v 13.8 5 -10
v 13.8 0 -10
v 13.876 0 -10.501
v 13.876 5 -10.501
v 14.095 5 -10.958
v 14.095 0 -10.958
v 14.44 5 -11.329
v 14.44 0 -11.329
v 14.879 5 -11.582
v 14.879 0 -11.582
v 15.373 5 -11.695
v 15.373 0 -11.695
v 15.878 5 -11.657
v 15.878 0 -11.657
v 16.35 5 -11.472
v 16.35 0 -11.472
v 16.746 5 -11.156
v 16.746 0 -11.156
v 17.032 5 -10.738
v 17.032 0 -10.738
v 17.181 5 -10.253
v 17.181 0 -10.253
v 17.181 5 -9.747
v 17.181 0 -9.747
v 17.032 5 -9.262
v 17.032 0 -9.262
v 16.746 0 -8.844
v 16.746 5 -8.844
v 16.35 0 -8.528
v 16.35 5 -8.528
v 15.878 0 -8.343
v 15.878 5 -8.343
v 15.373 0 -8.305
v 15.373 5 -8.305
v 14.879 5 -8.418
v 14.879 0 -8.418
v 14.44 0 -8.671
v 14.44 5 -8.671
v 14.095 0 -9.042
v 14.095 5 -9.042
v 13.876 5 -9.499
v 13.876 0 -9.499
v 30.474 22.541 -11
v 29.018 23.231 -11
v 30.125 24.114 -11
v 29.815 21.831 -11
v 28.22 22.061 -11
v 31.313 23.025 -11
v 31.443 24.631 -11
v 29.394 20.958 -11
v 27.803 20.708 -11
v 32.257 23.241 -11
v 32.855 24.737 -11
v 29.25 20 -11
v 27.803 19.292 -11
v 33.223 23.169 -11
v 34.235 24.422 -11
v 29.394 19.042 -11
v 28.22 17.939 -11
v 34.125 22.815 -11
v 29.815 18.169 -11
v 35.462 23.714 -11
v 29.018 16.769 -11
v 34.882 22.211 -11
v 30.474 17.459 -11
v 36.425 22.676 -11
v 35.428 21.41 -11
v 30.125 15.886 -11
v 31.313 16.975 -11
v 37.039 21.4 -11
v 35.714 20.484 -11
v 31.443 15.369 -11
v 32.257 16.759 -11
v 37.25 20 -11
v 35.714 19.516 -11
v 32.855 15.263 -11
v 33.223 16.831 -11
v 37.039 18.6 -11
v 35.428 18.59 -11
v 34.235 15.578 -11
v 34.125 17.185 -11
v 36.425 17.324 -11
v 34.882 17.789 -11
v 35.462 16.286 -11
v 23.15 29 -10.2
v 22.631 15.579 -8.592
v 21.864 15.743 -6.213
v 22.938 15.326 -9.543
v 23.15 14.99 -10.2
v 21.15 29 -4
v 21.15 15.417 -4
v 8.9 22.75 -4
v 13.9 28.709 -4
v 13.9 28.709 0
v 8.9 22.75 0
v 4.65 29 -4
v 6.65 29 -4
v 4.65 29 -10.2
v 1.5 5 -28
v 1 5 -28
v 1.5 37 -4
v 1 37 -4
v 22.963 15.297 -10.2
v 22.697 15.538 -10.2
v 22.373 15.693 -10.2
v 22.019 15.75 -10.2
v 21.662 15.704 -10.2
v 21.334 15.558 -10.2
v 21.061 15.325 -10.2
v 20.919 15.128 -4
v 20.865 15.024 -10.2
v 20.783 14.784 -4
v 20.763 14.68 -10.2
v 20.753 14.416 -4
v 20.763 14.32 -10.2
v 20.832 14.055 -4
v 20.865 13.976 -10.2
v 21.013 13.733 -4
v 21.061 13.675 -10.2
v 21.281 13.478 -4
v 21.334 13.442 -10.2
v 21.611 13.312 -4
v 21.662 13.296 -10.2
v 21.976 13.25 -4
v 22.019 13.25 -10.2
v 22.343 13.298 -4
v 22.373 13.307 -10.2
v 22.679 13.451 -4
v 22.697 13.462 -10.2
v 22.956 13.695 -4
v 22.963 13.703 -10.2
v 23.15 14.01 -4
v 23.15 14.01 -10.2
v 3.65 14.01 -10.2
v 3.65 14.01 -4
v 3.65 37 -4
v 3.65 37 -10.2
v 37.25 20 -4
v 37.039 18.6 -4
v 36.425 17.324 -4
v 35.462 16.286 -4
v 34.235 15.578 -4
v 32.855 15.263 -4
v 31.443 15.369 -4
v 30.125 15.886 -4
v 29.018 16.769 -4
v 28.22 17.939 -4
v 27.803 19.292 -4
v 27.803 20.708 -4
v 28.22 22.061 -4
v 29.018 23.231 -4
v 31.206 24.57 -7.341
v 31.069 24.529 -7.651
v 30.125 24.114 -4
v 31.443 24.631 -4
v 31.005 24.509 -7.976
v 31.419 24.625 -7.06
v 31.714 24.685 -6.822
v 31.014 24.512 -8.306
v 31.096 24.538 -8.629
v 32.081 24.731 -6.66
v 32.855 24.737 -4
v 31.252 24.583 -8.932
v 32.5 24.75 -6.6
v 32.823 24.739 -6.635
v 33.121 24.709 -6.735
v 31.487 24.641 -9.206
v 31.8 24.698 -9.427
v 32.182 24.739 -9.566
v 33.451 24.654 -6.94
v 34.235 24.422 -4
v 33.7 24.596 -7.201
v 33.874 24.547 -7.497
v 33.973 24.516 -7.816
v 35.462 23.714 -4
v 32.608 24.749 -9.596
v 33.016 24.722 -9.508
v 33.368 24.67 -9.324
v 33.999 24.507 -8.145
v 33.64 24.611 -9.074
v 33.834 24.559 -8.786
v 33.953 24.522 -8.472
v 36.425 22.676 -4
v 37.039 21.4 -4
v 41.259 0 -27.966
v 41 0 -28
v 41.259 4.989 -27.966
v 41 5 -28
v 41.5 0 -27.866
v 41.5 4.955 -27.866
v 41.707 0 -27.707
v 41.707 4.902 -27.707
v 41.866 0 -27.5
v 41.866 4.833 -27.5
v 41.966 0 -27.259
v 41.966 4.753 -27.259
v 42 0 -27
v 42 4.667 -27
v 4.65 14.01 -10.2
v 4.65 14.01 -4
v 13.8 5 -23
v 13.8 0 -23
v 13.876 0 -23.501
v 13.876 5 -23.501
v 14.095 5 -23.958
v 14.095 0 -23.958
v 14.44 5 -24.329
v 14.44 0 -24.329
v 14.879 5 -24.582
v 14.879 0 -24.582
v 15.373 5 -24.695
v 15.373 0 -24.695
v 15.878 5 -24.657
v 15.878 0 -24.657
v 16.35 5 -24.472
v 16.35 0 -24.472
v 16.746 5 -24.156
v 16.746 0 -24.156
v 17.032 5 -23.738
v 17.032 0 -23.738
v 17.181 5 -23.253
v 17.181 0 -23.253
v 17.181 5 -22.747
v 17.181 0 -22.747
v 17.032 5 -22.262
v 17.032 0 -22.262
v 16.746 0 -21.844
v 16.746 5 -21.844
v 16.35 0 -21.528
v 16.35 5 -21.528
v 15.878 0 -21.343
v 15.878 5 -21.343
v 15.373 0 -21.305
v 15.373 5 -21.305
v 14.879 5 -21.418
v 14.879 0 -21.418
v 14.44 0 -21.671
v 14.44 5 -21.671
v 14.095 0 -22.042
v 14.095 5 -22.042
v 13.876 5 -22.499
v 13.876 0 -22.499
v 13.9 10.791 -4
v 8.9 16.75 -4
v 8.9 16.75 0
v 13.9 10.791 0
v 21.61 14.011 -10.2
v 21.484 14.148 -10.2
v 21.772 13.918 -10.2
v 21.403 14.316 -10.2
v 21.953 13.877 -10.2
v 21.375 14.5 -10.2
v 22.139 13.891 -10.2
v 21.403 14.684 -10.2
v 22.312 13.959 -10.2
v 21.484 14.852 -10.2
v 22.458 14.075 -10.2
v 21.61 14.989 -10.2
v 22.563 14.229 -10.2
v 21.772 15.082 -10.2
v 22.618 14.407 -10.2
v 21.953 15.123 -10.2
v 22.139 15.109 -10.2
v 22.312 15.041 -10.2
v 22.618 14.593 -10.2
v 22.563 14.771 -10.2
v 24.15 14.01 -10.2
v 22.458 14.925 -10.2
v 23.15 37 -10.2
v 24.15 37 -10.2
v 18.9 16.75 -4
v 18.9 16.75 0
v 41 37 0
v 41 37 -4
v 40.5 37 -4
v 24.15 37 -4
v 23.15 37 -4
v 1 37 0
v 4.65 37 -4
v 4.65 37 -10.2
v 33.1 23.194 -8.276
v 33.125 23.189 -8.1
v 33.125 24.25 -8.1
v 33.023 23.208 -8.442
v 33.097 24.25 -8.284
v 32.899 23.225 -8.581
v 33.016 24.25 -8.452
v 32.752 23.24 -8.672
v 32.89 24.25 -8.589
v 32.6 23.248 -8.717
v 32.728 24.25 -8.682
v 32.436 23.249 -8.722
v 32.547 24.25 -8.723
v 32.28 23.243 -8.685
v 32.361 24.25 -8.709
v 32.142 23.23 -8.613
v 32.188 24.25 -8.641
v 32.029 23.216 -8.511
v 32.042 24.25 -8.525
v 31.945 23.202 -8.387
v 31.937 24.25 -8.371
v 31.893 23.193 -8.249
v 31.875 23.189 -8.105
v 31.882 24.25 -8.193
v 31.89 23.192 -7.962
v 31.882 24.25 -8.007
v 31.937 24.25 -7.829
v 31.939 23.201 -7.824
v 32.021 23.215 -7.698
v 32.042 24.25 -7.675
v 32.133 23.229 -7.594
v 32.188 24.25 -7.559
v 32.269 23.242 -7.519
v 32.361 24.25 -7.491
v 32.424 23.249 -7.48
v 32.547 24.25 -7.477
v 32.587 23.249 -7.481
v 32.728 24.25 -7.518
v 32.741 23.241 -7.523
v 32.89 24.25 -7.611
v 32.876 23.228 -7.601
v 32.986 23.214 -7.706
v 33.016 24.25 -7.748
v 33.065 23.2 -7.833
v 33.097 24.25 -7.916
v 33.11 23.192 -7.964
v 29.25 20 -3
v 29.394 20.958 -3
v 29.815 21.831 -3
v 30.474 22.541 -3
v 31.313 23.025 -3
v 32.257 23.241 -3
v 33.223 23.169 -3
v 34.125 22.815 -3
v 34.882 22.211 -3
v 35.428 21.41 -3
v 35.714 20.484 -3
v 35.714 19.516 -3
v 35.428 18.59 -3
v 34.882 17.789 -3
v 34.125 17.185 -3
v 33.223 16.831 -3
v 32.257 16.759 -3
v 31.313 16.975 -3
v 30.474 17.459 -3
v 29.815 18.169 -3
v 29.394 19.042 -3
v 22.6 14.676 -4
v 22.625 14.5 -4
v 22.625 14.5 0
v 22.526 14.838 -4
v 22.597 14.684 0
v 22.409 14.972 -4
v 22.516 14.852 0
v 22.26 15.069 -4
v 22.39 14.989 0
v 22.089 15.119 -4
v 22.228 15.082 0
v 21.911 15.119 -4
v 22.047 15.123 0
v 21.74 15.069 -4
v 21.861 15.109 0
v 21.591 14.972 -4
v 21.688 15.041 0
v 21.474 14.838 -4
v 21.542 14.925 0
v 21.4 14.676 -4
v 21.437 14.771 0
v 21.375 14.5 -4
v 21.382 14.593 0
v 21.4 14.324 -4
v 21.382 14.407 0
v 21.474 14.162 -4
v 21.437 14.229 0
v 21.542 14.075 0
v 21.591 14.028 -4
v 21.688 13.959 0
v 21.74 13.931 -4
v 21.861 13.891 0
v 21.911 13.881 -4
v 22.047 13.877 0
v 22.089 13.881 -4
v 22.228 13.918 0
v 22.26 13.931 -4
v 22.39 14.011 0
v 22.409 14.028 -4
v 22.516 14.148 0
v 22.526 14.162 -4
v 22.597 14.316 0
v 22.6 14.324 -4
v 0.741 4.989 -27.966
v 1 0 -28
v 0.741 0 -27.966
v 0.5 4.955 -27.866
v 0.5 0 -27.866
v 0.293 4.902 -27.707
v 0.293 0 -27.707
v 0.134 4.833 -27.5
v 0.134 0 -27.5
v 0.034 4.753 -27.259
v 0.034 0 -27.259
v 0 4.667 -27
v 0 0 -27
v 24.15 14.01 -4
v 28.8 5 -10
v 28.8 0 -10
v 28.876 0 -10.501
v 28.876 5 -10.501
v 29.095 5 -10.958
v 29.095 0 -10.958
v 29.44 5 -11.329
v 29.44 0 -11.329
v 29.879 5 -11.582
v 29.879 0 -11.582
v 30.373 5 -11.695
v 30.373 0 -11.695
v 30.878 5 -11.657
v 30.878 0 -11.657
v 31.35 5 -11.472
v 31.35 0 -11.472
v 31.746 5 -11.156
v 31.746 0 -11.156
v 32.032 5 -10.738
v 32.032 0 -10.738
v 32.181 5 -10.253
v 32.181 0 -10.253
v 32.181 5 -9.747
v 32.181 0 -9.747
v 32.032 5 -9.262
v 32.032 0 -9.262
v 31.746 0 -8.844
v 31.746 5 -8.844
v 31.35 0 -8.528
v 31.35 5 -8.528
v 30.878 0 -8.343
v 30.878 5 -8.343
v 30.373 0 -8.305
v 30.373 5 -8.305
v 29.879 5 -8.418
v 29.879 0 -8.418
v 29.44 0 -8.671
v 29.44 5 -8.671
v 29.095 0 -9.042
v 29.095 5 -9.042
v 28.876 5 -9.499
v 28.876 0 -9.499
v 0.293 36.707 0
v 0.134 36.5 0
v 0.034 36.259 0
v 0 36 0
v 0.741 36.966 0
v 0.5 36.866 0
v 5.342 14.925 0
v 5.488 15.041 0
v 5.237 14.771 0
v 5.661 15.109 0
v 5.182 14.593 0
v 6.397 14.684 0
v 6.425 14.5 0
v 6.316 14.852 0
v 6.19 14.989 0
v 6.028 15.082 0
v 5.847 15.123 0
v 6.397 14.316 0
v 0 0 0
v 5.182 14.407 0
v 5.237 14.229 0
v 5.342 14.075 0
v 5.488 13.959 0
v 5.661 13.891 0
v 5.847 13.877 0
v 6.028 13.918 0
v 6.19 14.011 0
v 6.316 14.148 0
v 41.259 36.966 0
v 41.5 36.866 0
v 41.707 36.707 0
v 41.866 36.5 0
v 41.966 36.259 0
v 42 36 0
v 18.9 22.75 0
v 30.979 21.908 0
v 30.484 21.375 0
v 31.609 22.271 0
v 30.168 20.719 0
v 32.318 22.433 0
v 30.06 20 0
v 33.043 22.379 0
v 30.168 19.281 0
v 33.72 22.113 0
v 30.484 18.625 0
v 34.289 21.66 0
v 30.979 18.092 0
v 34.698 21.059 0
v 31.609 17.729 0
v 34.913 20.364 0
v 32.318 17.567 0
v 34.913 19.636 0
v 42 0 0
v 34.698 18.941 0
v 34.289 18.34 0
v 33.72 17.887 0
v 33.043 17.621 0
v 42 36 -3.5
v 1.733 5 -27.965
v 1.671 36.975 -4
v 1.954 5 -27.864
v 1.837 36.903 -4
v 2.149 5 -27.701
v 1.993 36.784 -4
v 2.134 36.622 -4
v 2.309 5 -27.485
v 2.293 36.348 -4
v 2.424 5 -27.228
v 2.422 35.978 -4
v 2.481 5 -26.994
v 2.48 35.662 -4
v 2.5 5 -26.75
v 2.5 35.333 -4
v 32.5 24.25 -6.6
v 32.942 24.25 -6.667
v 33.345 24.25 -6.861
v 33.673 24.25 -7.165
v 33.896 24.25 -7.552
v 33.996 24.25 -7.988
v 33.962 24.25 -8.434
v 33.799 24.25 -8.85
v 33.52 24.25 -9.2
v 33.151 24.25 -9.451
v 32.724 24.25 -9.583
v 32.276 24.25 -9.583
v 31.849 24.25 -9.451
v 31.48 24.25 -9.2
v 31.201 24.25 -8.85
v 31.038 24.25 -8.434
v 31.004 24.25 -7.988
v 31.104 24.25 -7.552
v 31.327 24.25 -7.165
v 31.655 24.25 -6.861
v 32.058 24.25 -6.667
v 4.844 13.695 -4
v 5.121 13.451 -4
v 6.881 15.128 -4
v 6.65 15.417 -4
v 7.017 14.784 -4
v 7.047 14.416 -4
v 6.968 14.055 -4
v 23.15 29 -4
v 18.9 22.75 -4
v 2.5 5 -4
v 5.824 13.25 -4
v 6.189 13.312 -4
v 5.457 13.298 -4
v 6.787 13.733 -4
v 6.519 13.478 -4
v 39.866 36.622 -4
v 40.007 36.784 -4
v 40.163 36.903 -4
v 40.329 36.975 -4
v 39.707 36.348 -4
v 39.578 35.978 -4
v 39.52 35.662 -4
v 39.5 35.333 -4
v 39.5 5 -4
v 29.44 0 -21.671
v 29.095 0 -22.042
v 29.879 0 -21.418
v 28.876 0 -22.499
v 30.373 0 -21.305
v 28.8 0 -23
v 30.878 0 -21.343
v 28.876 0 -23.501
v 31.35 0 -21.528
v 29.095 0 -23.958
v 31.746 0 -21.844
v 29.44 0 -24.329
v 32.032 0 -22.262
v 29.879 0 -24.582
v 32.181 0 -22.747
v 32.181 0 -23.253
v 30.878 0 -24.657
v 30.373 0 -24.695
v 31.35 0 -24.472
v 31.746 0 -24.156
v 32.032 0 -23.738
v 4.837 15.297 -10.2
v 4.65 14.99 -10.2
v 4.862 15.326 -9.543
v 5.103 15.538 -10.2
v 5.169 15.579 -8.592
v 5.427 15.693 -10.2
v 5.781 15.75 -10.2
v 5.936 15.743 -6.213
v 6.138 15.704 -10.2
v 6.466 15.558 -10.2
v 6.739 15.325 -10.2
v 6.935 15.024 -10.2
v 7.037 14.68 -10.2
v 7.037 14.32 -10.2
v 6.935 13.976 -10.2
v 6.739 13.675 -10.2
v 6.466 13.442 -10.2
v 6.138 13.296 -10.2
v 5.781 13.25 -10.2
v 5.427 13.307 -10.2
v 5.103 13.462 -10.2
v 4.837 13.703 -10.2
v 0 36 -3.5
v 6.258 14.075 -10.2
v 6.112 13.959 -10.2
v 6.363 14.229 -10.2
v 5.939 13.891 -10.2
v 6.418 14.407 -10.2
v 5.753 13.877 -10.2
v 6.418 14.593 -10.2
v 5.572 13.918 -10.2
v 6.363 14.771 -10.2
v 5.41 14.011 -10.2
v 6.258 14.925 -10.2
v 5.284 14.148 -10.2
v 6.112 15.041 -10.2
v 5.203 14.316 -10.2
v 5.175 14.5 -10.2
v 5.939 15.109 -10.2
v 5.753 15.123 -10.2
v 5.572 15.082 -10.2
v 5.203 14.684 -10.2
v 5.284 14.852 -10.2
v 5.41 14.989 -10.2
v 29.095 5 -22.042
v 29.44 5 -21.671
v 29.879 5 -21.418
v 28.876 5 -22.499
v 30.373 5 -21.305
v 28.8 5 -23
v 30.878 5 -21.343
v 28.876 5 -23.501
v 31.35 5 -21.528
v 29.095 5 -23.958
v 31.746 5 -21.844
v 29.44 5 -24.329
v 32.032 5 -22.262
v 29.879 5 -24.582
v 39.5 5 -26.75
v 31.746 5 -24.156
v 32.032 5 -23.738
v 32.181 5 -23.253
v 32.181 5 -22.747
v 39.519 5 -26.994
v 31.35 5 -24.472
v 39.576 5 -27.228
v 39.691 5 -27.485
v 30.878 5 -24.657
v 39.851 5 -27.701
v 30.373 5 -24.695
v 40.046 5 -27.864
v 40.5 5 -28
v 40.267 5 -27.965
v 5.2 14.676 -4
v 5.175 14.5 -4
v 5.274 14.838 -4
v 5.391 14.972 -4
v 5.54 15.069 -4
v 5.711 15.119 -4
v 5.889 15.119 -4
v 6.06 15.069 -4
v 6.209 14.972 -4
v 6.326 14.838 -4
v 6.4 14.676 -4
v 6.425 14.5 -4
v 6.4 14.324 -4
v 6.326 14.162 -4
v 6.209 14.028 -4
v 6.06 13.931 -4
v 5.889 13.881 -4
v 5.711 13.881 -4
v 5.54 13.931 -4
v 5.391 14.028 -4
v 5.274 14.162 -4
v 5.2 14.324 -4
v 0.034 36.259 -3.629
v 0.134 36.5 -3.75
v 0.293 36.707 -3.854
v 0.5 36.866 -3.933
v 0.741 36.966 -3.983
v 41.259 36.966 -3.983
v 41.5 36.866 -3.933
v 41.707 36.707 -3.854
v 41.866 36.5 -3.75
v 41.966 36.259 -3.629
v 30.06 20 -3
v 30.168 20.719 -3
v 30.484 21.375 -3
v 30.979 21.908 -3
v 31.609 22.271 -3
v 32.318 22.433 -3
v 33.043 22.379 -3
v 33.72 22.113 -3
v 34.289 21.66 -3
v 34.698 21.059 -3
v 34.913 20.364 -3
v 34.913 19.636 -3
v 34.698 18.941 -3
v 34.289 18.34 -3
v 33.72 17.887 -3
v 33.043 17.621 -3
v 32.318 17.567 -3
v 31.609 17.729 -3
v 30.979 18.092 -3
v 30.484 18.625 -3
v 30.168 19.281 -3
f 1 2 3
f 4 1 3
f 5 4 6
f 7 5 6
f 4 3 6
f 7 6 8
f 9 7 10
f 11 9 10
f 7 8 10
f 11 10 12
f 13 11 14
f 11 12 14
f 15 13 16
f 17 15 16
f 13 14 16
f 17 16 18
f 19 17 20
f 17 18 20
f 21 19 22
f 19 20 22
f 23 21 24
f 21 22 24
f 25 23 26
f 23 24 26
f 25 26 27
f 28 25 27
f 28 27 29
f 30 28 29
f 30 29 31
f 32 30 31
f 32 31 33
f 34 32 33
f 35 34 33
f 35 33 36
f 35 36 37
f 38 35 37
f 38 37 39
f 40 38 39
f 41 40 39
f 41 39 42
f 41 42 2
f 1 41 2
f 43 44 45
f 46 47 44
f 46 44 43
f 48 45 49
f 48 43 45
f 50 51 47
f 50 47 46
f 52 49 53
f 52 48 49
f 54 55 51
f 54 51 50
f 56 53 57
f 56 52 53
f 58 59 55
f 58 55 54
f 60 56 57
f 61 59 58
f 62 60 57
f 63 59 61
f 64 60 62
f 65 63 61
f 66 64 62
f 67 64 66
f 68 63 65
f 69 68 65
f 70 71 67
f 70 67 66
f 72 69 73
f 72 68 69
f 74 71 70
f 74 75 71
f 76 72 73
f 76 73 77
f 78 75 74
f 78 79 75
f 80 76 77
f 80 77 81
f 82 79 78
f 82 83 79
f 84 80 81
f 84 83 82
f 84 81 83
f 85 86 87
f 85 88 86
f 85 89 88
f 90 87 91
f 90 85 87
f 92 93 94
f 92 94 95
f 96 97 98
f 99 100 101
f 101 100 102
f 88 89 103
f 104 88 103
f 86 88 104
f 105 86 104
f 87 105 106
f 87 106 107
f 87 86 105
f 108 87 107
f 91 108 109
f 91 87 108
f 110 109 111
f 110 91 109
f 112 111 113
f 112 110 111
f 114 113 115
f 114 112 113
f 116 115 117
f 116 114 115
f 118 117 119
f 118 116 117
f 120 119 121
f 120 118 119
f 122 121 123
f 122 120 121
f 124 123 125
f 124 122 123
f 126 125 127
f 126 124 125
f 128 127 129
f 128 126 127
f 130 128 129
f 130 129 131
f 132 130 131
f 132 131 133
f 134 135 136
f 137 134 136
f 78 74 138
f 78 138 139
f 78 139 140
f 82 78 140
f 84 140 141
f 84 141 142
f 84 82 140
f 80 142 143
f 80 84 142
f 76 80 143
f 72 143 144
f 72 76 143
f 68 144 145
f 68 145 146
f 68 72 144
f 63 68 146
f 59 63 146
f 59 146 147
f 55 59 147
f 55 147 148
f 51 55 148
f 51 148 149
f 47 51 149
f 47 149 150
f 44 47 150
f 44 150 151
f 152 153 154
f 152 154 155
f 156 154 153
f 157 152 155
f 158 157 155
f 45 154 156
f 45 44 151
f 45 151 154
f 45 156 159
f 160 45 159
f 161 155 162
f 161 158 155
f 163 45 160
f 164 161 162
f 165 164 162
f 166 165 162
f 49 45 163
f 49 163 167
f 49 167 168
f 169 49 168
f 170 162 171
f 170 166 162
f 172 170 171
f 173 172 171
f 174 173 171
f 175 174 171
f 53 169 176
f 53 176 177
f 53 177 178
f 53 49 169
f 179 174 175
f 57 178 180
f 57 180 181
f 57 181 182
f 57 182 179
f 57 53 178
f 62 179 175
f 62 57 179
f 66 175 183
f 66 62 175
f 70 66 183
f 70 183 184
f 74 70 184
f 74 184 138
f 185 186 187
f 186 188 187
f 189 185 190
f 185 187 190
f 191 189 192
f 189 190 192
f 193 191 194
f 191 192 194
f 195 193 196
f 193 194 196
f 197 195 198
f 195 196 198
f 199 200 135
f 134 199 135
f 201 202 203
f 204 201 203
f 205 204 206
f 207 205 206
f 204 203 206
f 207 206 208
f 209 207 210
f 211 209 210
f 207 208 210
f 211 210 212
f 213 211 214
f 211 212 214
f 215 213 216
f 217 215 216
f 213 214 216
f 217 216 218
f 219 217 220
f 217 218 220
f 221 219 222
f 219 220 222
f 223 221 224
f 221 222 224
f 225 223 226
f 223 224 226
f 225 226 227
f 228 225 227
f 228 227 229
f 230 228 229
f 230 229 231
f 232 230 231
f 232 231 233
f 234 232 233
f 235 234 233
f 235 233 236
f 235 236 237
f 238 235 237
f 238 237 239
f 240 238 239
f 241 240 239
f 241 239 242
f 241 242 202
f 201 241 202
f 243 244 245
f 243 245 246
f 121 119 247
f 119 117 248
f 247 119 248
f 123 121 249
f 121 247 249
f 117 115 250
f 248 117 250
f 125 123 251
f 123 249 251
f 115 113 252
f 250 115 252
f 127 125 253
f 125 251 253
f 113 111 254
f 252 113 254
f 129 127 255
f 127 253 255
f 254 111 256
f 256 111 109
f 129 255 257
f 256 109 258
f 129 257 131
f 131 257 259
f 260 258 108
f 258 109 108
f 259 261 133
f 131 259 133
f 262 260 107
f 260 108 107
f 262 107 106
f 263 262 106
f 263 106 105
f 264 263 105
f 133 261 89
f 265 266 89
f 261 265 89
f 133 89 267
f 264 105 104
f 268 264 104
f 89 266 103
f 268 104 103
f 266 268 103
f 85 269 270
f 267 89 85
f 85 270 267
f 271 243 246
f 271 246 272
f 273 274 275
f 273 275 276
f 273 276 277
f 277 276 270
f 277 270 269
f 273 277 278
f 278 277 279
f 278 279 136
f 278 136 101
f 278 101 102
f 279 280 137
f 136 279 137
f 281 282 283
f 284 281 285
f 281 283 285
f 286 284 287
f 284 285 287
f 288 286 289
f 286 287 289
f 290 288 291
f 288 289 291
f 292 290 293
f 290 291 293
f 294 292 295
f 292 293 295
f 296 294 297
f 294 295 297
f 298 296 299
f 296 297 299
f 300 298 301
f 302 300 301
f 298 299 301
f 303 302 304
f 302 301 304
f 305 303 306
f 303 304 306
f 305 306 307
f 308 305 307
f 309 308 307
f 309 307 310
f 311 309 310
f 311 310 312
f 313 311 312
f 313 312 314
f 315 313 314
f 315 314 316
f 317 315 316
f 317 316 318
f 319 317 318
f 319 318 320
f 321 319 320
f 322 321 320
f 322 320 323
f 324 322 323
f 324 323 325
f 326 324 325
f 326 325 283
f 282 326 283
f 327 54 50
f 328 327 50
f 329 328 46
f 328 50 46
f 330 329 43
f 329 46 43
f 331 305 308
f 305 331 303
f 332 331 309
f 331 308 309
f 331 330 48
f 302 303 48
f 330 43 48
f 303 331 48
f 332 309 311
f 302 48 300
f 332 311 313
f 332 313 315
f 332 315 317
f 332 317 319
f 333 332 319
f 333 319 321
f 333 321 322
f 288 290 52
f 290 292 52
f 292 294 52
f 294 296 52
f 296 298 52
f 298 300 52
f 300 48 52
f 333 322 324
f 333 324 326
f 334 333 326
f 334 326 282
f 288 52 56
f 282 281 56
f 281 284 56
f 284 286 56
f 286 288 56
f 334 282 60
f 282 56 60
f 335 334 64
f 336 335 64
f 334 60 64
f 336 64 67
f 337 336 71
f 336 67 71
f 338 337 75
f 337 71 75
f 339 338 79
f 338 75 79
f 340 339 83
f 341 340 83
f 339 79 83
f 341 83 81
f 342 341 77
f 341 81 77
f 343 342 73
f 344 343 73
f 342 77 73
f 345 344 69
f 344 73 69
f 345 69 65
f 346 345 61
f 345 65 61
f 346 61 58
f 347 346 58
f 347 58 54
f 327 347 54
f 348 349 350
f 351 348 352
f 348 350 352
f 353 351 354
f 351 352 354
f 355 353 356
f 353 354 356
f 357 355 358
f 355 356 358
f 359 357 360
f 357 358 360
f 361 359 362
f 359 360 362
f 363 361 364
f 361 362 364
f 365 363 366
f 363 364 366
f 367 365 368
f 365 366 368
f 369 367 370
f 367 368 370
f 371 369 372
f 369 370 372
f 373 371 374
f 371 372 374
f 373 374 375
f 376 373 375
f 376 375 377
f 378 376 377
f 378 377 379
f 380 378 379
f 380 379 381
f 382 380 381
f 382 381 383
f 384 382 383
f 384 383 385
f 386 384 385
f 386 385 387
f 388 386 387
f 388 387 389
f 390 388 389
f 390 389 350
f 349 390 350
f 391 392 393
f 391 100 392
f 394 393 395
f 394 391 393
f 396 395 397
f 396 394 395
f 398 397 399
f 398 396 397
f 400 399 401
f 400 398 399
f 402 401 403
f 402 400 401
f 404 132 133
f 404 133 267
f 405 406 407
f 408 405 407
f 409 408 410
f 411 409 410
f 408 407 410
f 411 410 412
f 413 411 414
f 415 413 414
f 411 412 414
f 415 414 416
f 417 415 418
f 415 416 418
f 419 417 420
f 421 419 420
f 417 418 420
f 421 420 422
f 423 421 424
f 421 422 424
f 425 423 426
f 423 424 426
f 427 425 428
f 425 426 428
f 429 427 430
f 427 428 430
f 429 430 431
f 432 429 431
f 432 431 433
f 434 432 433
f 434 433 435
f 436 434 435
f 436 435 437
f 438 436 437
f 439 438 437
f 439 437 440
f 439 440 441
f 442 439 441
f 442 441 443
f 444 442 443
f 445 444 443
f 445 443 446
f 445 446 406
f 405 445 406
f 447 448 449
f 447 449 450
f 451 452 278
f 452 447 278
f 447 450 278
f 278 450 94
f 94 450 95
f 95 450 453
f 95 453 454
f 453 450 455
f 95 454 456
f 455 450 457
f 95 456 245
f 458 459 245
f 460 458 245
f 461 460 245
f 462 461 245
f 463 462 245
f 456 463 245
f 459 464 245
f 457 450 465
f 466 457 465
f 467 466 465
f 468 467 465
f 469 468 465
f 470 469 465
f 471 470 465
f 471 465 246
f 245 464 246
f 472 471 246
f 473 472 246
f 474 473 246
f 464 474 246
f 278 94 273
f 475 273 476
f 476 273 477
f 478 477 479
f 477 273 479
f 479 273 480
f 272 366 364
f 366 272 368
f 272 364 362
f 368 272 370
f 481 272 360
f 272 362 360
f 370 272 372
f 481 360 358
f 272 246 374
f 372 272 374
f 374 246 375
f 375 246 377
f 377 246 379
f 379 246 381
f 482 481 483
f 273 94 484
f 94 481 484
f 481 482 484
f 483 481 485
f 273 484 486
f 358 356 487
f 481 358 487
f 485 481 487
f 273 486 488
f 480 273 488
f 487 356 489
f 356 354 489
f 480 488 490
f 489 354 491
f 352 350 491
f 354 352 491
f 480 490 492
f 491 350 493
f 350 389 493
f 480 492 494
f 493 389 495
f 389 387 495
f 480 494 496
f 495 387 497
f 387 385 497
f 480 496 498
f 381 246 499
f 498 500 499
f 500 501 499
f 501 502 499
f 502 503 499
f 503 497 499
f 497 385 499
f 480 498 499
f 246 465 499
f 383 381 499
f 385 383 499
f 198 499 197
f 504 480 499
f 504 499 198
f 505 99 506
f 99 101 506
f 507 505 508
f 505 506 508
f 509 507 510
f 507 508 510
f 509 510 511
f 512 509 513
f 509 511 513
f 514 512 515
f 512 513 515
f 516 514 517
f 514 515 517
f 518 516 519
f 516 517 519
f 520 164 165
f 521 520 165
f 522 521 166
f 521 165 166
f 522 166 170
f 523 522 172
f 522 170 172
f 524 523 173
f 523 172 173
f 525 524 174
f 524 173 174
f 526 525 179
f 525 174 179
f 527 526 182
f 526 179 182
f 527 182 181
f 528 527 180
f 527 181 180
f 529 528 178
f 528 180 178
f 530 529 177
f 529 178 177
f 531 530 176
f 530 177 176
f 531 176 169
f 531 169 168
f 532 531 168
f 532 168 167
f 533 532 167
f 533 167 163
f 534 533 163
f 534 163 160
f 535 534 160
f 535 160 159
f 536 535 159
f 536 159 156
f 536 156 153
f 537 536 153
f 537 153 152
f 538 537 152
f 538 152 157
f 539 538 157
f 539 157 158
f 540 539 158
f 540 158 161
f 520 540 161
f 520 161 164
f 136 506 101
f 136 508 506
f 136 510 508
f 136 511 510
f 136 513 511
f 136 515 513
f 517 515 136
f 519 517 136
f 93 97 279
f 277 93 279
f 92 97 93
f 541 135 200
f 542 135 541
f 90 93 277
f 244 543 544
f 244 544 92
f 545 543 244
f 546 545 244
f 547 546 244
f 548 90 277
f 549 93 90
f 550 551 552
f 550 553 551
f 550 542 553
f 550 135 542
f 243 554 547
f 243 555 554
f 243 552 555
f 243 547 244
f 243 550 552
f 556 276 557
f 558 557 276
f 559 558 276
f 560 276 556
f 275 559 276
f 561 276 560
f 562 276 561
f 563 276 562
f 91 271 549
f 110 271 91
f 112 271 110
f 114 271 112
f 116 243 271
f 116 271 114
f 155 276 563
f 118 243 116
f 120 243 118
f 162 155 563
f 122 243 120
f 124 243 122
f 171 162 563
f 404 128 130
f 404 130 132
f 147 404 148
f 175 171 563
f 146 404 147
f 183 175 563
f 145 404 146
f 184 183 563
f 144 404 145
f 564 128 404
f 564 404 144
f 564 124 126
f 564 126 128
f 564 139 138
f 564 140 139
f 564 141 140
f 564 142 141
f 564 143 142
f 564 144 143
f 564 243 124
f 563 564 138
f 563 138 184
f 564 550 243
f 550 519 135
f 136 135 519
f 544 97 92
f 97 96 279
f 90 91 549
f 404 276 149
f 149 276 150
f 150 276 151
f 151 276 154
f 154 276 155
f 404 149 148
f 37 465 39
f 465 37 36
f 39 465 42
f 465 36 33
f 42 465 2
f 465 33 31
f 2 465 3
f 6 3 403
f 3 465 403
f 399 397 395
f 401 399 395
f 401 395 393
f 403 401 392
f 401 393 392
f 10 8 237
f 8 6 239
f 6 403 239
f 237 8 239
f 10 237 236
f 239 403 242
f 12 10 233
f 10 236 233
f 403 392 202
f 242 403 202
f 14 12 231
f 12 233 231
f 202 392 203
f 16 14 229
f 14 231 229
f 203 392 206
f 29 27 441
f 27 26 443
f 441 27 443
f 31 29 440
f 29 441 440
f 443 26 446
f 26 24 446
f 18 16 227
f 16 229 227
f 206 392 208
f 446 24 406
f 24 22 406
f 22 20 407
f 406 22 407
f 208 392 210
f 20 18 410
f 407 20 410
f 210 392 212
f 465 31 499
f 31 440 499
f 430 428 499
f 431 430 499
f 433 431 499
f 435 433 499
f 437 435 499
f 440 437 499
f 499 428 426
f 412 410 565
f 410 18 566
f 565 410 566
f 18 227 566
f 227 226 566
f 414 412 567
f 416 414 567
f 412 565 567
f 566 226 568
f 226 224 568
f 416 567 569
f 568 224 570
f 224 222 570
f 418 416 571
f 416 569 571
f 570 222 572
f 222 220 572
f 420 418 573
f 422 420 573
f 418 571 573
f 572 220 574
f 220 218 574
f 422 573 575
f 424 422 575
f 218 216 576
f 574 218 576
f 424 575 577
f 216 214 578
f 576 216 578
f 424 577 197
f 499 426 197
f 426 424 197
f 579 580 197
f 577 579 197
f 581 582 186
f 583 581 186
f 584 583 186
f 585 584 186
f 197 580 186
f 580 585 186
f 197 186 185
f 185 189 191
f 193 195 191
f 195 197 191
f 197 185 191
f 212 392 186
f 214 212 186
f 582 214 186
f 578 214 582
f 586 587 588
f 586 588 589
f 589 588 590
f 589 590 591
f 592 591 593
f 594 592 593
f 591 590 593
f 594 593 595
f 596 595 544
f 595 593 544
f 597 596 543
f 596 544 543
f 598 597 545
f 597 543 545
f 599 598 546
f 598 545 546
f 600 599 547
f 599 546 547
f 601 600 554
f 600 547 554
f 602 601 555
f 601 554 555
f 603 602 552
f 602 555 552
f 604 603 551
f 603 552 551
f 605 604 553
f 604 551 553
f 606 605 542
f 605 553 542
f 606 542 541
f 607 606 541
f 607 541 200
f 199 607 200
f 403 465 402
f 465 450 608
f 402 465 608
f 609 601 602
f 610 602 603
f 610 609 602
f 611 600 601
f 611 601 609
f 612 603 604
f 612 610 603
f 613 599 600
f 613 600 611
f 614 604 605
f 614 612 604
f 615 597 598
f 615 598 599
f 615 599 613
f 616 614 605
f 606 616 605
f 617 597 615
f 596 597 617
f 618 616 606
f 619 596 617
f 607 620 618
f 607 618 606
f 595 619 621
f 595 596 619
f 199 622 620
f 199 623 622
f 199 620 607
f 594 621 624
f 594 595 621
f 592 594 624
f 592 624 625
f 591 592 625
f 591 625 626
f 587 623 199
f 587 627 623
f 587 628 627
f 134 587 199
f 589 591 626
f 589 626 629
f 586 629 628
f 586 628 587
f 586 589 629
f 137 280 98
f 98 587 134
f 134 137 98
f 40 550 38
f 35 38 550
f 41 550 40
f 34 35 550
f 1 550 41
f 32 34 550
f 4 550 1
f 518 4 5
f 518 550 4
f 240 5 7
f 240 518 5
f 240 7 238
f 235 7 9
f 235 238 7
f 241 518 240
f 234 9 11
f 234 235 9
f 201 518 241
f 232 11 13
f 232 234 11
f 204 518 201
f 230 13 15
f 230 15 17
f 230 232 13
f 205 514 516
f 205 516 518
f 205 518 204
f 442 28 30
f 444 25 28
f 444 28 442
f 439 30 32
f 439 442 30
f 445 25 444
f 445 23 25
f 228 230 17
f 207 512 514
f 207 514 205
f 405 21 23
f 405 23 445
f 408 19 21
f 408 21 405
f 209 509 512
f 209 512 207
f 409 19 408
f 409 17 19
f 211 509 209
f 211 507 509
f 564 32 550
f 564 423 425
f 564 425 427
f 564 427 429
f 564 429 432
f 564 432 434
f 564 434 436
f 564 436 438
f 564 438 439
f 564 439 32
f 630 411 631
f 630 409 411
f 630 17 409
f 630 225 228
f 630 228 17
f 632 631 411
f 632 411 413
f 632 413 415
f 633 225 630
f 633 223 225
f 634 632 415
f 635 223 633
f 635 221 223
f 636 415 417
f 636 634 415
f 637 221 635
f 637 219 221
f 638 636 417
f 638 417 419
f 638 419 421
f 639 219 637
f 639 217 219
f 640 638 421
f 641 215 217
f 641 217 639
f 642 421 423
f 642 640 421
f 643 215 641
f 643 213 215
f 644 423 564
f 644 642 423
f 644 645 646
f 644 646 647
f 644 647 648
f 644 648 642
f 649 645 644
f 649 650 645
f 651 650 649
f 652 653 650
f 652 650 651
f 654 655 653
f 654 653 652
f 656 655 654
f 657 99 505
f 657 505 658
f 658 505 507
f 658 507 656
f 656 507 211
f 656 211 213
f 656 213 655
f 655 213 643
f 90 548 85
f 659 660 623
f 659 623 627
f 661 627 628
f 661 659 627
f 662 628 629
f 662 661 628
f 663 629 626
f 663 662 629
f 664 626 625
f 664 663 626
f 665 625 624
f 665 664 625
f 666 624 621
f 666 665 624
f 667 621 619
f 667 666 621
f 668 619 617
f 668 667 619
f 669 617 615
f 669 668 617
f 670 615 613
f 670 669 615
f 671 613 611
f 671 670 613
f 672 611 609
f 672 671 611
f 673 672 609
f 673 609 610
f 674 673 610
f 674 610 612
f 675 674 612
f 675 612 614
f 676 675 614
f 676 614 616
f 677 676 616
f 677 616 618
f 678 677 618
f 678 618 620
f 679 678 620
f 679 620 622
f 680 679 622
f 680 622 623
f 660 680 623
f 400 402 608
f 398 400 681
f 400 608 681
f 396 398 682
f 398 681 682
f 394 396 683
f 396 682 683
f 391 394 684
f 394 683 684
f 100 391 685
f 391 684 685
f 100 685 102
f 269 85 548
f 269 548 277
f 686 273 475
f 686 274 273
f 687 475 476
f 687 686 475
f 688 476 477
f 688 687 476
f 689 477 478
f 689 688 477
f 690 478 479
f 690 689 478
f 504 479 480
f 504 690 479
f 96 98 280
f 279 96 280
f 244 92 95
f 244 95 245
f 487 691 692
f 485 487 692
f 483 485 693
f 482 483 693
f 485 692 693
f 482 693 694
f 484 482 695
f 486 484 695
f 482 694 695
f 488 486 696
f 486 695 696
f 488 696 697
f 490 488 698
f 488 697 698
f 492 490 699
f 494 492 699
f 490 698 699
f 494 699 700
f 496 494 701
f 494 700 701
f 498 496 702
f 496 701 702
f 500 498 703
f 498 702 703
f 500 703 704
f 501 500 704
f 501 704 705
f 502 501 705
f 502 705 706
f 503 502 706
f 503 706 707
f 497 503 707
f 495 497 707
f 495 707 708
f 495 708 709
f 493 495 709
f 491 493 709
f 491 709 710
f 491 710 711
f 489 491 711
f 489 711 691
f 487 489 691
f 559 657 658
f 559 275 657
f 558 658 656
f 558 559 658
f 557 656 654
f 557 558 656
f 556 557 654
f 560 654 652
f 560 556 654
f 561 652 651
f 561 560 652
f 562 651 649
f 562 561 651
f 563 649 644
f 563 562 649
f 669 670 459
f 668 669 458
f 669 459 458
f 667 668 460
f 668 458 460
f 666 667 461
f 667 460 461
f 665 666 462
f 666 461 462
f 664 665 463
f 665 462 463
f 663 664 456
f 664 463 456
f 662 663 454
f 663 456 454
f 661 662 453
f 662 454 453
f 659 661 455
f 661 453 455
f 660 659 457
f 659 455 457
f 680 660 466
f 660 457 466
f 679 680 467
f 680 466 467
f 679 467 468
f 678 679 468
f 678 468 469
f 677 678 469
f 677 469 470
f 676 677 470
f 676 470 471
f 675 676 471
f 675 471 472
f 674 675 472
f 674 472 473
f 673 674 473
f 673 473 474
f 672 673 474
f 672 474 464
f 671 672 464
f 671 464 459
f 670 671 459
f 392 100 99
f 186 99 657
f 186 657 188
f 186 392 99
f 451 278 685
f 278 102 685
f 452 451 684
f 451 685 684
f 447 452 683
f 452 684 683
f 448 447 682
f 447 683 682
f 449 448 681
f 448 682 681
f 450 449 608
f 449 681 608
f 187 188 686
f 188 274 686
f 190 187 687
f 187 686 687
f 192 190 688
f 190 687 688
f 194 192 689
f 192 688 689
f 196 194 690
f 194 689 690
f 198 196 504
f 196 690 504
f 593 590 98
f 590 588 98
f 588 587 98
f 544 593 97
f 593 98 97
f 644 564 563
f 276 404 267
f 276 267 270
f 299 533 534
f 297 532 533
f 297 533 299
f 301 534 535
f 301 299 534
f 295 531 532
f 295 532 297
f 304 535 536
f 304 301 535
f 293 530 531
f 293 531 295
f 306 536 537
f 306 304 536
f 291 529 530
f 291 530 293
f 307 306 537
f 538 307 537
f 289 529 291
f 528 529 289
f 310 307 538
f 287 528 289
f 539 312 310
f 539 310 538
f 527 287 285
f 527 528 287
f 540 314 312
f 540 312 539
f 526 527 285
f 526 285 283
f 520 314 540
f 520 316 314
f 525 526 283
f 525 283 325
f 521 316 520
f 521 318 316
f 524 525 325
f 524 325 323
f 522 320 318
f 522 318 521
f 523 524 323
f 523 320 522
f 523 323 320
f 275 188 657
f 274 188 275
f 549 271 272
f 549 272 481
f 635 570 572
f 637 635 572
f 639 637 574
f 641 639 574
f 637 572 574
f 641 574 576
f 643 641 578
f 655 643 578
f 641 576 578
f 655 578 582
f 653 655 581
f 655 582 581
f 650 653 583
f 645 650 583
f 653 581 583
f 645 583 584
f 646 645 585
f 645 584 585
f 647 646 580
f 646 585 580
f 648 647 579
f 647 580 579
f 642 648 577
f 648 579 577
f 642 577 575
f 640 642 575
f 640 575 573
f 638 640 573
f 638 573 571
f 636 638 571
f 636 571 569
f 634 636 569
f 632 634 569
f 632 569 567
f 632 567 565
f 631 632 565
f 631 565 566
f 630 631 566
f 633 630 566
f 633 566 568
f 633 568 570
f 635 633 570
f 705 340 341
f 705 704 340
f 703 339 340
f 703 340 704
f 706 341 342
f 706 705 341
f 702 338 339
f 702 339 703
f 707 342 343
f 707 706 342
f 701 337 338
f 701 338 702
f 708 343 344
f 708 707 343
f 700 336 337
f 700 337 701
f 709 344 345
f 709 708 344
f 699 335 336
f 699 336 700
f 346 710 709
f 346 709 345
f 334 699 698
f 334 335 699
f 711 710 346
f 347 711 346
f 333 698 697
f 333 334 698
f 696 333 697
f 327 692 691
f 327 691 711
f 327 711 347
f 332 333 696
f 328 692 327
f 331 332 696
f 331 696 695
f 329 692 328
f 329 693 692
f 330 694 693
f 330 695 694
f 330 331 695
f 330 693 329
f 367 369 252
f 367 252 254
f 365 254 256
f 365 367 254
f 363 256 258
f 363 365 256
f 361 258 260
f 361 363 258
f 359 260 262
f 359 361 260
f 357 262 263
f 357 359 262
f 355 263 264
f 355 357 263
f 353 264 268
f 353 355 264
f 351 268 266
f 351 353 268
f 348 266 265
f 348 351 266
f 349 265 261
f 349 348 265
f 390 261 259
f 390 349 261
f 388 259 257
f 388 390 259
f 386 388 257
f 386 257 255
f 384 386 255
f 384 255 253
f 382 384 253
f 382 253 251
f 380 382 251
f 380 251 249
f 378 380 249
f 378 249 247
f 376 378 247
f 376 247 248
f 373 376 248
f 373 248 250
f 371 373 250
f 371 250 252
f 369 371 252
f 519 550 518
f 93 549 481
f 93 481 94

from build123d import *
from build123d.topology import SkipClean

# Parameters (mm, degrees)
SKETCH1_W                           = 42
SKETCH1_H                           = 28
BOSS_EXTRUDE1_DEPTH                 = 5
SKETCH2_W                           = 42
SKETCH2_H                           = 4
BOSS_EXTRUDE2_DEPTH                 = 32
TAP_DRILL_FOR_M1_6X0_35_TAP1_D      = 1.25
M3_CLEARANCE_HOLE1_D                = 3.4
BOSS_EXTRUDE3_DEPTH                 = 2.5
BOSS_EXTRUDE4_DEPTH                 = 2.5
FILLET2_R                           = 1
SKETCH9_R                           = 3.25
CUT_EXTRUDE1_DEPTH                  = 1
SKETCH10_R                          = 2.44
CUT_EXTRUDE2_DEPTH                  = 62.302528496
SKETCH11_R                          = 0.625
BOSS_EXTRUDE5_DEPTH                 = 6.2
CUT_EXTRUDE3_DEPTH                  = 61.901559914
BOSS_EXTRUDE6_REACH                 = 64.586
BOSS_EXTRUDE8_START                 = 7
SKETCH16_R                          = 4.75
SKETCH16_R_2                        = 3.25
BOSS_EXTRUDE8_DEPTH                 = 7
SKETCH17_R                          = 1.5
CUT_EXTRUDE4_DEPTH                  = 0.5
TAP_DRILL_FOR_M1_6X0_35_TAP2_REACH  = 58.001
TAP_DRILL_FOR_M1_6X0_35_TAP2_BORE_R = 0.625
SKETCH21_W                          = 2
SKETCH21_H                          = 8
CUT_EXTRUDE5_DEPTH                  = 6.2


with BuildPart() as part:
    # Sketch1 → Boss-Extrude1 (new body)
    with BuildSketch(Plane(origin=(0, 0, 0), x_dir=(1, 0, 0), z_dir=(0, 1, 0))):
        with Locations((21, 14)):
            Rectangle(SKETCH1_W, SKETCH1_H)
    extrude(amount=BOSS_EXTRUDE1_DEPTH)

    # Sketch2 → Boss-Extrude2 (add)
    with BuildSketch(Plane(origin=(0, 5, 0), x_dir=(1, 0, 0), z_dir=(0, 1, 0))):
        with Locations((21, 2)):
            Rectangle(SKETCH2_W, SKETCH2_H)
    extrude(amount=BOSS_EXTRUDE2_DEPTH)

    # Tap Drill for M1.6x0.35 Tap1 (through all)
    with Locations(Plane(origin=(0, 0, -4), x_dir=(-1, 0, 0), z_dir=(0, 0, -1))):
        with Locations((-22, 14.5), (-5.8, 14.5)):
            Hole(TAP_DRILL_FOR_M1_6X0_35_TAP1_D / 2)

    # M3 Clearance Hole1 (through all)
    with Locations(Plane(origin=(0, 5, 0), x_dir=(1, 0, 0), z_dir=(0, 1, 0))):
        with Locations((15.5, 23), (30.5, 23), (30.5, 10), (15.5, 10)):
            Hole(M3_CLEARANCE_HOLE1_D / 2)

    # Sketch7 → Boss-Extrude3 (add)
    with BuildSketch(Plane.ZY):
        Polygon((-28, 5), (-4, 37), (-4, 5), align=None)
    extrude(amount=-BOSS_EXTRUDE3_DEPTH)

    # Sketch8 → Boss-Extrude4 (add)
    with BuildSketch(Plane(origin=(42, 0, 0), x_dir=(0, 0, -1), z_dir=(1, 0, 0))):
        Polygon((28, 5), (4, 37), (4, 5), align=None)
    extrude(amount=-BOSS_EXTRUDE4_DEPTH)

    # Fillet2
    fillet2_edges = [part.edges().sort_by_distance(p)[0] for p in [
        (0, 37, -2),
        (42, 37, -2),
        (2.5, 21, -16),
        (0, 21, -16),
        (39.5, 21, -16),
        (42, 21, -16),
        (0, 2.5, -28),
        (42, 2.5, -28),
    ]]
    fillet(fillet2_edges, radius=FILLET2_R)

    # Sketch9 → Cut-Extrude1 (cut)
    with BuildSketch(Plane(origin=(0, 0, -4), x_dir=(-1, 0, 0), z_dir=(0, 0, -1))):
        with Locations((-32.5, 20)):
            Circle(SKETCH9_R)
    extrude(amount=-CUT_EXTRUDE1_DEPTH, mode=Mode.SUBTRACT)

    # Sketch10 → Cut-Extrude2 (cut, through all)
    with BuildSketch(Plane(origin=(0, 0, -3), x_dir=(-1, 0, 0), z_dir=(0, 0, -1))):
        with Locations((-32.5, 20)):
            Circle(SKETCH10_R)
    extrude(amount=-CUT_EXTRUDE2_DEPTH, mode=Mode.SUBTRACT)

    # Sketch11 → Boss-Extrude5 (add)
    # profile 1 of 2: a face of its own
    with SkipClean():  # the faces are left unmerged after this step: merging them gives an invalid solid
        with BuildSketch(Plane(origin=(0, 0, -4), x_dir=(-1, 0, 0), z_dir=(0, 0, -1))):
            with BuildLine():
                Line((-3.65, 37), (-4.65, 37))
                Line((-4.65, 37), (-4.65, 14.989897949))
                ThreePointArc((-4.65, 14.989897949), (-7.05, 14.5), (-4.65, 14.010102051))
                Line((-4.65, 14.010102051), (-3.65, 14.010102051))
                Line((-3.65, 14.010102051), (-3.65, 37))
            make_face()
            with Locations((-5.8, 14.5)):
                Circle(SKETCH11_R, mode=Mode.SUBTRACT)
        # profile 2 of 2: a face of its own
        with BuildSketch(Plane(origin=(0, 0, -4), x_dir=(-1, 0, 0), z_dir=(0, 0, -1))):
            with BuildLine():
                Line((-24.15, 37), (-23.15, 37))
                Line((-23.15, 37), (-23.15, 14.989897949))
                ThreePointArc((-23.15, 14.989897949), (-20.75, 14.5), (-23.15, 14.010102051))
                Line((-23.15, 14.010102051), (-24.15, 14.010102051))
                Line((-24.15, 14.010102051), (-24.15, 37))
            make_face()
            with Locations((-22, 14.5)):
                Circle(SKETCH11_R, mode=Mode.SUBTRACT)
        extrude(amount=BOSS_EXTRUDE5_DEPTH)
    add(part.part.scale(1), mode=Mode.REPLACE)  # the faces are merged on a copy

    # Sketch13 → Cut-Extrude3 (cut, through all)
    with BuildSketch(Plane(origin=(0, 0, -4), x_dir=(-1, 0, 0), z_dir=(0, 0, -1))):
        Polygon((-13.9, 28.708767963), (-8.9, 22.75), (-8.9, 16.75), (-13.9, 10.791232037), (-18.9, 16.75), (-18.9, 22.75), align=None)
    extrude(amount=-CUT_EXTRUDE3_DEPTH, mode=Mode.SUBTRACT)

    # Sketch14 → Boss-Extrude6 (add, up to next)
    with BuildSketch(Plane(origin=(0, 37, 0), x_dir=(1, 0, 0), z_dir=(0, 1, 0)), mode=Mode.PRIVATE) as boss_extrude6_sk1:
        Polygon((23.15, 10.2), (21.15, 4), (23.15, 4), align=None)
    boss_extrude6_tool1 = extrude(boss_extrude6_sk1.sketch, amount=-BOSS_EXTRUDE6_REACH, mode=Mode.PRIVATE) - part.part
    # Sketch14 → Boss-Extrude6 (add, up to next)
    with BuildSketch(Plane(origin=(0, 37, 0), x_dir=(1, 0, 0), z_dir=(0, 1, 0)), mode=Mode.PRIVATE) as boss_extrude6_sk2:
        Polygon((4.65, 10.2), (6.65, 4), (4.65, 4), align=None)
    boss_extrude6_tool2 = extrude(boss_extrude6_sk2.sketch, amount=-BOSS_EXTRUDE6_REACH, mode=Mode.PRIVATE) - part.part
    add(boss_extrude6_tool1.solids().sort_by_distance((22.483333, 37, -6.066667))[0])
    add(boss_extrude6_tool2.solids().sort_by_distance((5.316667, 37, -6.066667))[0])

    # Sketch16 → Boss-Extrude8 (add)
    with SkipClean():  # the faces are left unmerged after this step: merging them gives an invalid solid
        with BuildSketch(Plane(origin=(0, 0, -4), x_dir=(-1, 0, 0), z_dir=(0, 0, -1)).offset(BOSS_EXTRUDE8_START)):
            with Locations(Location((-32.5, 20, 0), (0, 0, 180))):
                Circle(SKETCH16_R)
            with Locations((-32.5, 20)):
                Circle(SKETCH16_R_2, mode=Mode.SUBTRACT)
        extrude(amount=-BOSS_EXTRUDE8_DEPTH)

    # Sketch17 → Cut-Extrude4 (cut)
    with SkipClean():  # the faces are left unmerged after this step: merging them gives an invalid solid
        with BuildSketch(Plane(origin=(0, 24.75, 0), x_dir=(1, 0, 0), z_dir=(0, 1, 0))):
            with Locations(Location((32.5, 8.1, 0), (0, 0, 270))):
                Circle(SKETCH17_R)
        extrude(amount=-CUT_EXTRUDE4_DEPTH, mode=Mode.SUBTRACT)

    # Tap Drill for M1.6x0.35 Tap2 bore → Tap Drill for M1.6x0.35 Tap2 (cut, up to next)
    with BuildSketch(Plane(origin=(0, 24.25, 0), x_dir=(1, 0, 0), z_dir=(0, 1, 0)), mode=Mode.PRIVATE) as tap_drill_for_m1_6x0_35_tap2_sk1:
        with Locations((32.5, 8.1)):
            Circle(TAP_DRILL_FOR_M1_6X0_35_TAP2_BORE_R)
    tap_drill_for_m1_6x0_35_tap2_tool1 = extrude(tap_drill_for_m1_6x0_35_tap2_sk1.sketch, amount=-TAP_DRILL_FOR_M1_6X0_35_TAP2_REACH, mode=Mode.PRIVATE) & part.part
    add(tap_drill_for_m1_6x0_35_tap2_tool1.solids().sort_by_distance((32.5, 24.25, -8.1))[0], mode=Mode.SUBTRACT)

    # Sketch21 → Cut-Extrude5 (cut)
    with BuildSketch(Plane(origin=(0, 0, -10.2), x_dir=(-1, 0, 0), z_dir=(0, 0, -1))):
        with Locations((-5.65, 33)):
            Rectangle(SKETCH21_W, SKETCH21_H)
        with Locations((-22.15, 33)):
            Rectangle(SKETCH21_W, SKETCH21_H)
    extrude(amount=-CUT_EXTRUDE5_DEPTH, mode=Mode.SUBTRACT)


solid = part.part
